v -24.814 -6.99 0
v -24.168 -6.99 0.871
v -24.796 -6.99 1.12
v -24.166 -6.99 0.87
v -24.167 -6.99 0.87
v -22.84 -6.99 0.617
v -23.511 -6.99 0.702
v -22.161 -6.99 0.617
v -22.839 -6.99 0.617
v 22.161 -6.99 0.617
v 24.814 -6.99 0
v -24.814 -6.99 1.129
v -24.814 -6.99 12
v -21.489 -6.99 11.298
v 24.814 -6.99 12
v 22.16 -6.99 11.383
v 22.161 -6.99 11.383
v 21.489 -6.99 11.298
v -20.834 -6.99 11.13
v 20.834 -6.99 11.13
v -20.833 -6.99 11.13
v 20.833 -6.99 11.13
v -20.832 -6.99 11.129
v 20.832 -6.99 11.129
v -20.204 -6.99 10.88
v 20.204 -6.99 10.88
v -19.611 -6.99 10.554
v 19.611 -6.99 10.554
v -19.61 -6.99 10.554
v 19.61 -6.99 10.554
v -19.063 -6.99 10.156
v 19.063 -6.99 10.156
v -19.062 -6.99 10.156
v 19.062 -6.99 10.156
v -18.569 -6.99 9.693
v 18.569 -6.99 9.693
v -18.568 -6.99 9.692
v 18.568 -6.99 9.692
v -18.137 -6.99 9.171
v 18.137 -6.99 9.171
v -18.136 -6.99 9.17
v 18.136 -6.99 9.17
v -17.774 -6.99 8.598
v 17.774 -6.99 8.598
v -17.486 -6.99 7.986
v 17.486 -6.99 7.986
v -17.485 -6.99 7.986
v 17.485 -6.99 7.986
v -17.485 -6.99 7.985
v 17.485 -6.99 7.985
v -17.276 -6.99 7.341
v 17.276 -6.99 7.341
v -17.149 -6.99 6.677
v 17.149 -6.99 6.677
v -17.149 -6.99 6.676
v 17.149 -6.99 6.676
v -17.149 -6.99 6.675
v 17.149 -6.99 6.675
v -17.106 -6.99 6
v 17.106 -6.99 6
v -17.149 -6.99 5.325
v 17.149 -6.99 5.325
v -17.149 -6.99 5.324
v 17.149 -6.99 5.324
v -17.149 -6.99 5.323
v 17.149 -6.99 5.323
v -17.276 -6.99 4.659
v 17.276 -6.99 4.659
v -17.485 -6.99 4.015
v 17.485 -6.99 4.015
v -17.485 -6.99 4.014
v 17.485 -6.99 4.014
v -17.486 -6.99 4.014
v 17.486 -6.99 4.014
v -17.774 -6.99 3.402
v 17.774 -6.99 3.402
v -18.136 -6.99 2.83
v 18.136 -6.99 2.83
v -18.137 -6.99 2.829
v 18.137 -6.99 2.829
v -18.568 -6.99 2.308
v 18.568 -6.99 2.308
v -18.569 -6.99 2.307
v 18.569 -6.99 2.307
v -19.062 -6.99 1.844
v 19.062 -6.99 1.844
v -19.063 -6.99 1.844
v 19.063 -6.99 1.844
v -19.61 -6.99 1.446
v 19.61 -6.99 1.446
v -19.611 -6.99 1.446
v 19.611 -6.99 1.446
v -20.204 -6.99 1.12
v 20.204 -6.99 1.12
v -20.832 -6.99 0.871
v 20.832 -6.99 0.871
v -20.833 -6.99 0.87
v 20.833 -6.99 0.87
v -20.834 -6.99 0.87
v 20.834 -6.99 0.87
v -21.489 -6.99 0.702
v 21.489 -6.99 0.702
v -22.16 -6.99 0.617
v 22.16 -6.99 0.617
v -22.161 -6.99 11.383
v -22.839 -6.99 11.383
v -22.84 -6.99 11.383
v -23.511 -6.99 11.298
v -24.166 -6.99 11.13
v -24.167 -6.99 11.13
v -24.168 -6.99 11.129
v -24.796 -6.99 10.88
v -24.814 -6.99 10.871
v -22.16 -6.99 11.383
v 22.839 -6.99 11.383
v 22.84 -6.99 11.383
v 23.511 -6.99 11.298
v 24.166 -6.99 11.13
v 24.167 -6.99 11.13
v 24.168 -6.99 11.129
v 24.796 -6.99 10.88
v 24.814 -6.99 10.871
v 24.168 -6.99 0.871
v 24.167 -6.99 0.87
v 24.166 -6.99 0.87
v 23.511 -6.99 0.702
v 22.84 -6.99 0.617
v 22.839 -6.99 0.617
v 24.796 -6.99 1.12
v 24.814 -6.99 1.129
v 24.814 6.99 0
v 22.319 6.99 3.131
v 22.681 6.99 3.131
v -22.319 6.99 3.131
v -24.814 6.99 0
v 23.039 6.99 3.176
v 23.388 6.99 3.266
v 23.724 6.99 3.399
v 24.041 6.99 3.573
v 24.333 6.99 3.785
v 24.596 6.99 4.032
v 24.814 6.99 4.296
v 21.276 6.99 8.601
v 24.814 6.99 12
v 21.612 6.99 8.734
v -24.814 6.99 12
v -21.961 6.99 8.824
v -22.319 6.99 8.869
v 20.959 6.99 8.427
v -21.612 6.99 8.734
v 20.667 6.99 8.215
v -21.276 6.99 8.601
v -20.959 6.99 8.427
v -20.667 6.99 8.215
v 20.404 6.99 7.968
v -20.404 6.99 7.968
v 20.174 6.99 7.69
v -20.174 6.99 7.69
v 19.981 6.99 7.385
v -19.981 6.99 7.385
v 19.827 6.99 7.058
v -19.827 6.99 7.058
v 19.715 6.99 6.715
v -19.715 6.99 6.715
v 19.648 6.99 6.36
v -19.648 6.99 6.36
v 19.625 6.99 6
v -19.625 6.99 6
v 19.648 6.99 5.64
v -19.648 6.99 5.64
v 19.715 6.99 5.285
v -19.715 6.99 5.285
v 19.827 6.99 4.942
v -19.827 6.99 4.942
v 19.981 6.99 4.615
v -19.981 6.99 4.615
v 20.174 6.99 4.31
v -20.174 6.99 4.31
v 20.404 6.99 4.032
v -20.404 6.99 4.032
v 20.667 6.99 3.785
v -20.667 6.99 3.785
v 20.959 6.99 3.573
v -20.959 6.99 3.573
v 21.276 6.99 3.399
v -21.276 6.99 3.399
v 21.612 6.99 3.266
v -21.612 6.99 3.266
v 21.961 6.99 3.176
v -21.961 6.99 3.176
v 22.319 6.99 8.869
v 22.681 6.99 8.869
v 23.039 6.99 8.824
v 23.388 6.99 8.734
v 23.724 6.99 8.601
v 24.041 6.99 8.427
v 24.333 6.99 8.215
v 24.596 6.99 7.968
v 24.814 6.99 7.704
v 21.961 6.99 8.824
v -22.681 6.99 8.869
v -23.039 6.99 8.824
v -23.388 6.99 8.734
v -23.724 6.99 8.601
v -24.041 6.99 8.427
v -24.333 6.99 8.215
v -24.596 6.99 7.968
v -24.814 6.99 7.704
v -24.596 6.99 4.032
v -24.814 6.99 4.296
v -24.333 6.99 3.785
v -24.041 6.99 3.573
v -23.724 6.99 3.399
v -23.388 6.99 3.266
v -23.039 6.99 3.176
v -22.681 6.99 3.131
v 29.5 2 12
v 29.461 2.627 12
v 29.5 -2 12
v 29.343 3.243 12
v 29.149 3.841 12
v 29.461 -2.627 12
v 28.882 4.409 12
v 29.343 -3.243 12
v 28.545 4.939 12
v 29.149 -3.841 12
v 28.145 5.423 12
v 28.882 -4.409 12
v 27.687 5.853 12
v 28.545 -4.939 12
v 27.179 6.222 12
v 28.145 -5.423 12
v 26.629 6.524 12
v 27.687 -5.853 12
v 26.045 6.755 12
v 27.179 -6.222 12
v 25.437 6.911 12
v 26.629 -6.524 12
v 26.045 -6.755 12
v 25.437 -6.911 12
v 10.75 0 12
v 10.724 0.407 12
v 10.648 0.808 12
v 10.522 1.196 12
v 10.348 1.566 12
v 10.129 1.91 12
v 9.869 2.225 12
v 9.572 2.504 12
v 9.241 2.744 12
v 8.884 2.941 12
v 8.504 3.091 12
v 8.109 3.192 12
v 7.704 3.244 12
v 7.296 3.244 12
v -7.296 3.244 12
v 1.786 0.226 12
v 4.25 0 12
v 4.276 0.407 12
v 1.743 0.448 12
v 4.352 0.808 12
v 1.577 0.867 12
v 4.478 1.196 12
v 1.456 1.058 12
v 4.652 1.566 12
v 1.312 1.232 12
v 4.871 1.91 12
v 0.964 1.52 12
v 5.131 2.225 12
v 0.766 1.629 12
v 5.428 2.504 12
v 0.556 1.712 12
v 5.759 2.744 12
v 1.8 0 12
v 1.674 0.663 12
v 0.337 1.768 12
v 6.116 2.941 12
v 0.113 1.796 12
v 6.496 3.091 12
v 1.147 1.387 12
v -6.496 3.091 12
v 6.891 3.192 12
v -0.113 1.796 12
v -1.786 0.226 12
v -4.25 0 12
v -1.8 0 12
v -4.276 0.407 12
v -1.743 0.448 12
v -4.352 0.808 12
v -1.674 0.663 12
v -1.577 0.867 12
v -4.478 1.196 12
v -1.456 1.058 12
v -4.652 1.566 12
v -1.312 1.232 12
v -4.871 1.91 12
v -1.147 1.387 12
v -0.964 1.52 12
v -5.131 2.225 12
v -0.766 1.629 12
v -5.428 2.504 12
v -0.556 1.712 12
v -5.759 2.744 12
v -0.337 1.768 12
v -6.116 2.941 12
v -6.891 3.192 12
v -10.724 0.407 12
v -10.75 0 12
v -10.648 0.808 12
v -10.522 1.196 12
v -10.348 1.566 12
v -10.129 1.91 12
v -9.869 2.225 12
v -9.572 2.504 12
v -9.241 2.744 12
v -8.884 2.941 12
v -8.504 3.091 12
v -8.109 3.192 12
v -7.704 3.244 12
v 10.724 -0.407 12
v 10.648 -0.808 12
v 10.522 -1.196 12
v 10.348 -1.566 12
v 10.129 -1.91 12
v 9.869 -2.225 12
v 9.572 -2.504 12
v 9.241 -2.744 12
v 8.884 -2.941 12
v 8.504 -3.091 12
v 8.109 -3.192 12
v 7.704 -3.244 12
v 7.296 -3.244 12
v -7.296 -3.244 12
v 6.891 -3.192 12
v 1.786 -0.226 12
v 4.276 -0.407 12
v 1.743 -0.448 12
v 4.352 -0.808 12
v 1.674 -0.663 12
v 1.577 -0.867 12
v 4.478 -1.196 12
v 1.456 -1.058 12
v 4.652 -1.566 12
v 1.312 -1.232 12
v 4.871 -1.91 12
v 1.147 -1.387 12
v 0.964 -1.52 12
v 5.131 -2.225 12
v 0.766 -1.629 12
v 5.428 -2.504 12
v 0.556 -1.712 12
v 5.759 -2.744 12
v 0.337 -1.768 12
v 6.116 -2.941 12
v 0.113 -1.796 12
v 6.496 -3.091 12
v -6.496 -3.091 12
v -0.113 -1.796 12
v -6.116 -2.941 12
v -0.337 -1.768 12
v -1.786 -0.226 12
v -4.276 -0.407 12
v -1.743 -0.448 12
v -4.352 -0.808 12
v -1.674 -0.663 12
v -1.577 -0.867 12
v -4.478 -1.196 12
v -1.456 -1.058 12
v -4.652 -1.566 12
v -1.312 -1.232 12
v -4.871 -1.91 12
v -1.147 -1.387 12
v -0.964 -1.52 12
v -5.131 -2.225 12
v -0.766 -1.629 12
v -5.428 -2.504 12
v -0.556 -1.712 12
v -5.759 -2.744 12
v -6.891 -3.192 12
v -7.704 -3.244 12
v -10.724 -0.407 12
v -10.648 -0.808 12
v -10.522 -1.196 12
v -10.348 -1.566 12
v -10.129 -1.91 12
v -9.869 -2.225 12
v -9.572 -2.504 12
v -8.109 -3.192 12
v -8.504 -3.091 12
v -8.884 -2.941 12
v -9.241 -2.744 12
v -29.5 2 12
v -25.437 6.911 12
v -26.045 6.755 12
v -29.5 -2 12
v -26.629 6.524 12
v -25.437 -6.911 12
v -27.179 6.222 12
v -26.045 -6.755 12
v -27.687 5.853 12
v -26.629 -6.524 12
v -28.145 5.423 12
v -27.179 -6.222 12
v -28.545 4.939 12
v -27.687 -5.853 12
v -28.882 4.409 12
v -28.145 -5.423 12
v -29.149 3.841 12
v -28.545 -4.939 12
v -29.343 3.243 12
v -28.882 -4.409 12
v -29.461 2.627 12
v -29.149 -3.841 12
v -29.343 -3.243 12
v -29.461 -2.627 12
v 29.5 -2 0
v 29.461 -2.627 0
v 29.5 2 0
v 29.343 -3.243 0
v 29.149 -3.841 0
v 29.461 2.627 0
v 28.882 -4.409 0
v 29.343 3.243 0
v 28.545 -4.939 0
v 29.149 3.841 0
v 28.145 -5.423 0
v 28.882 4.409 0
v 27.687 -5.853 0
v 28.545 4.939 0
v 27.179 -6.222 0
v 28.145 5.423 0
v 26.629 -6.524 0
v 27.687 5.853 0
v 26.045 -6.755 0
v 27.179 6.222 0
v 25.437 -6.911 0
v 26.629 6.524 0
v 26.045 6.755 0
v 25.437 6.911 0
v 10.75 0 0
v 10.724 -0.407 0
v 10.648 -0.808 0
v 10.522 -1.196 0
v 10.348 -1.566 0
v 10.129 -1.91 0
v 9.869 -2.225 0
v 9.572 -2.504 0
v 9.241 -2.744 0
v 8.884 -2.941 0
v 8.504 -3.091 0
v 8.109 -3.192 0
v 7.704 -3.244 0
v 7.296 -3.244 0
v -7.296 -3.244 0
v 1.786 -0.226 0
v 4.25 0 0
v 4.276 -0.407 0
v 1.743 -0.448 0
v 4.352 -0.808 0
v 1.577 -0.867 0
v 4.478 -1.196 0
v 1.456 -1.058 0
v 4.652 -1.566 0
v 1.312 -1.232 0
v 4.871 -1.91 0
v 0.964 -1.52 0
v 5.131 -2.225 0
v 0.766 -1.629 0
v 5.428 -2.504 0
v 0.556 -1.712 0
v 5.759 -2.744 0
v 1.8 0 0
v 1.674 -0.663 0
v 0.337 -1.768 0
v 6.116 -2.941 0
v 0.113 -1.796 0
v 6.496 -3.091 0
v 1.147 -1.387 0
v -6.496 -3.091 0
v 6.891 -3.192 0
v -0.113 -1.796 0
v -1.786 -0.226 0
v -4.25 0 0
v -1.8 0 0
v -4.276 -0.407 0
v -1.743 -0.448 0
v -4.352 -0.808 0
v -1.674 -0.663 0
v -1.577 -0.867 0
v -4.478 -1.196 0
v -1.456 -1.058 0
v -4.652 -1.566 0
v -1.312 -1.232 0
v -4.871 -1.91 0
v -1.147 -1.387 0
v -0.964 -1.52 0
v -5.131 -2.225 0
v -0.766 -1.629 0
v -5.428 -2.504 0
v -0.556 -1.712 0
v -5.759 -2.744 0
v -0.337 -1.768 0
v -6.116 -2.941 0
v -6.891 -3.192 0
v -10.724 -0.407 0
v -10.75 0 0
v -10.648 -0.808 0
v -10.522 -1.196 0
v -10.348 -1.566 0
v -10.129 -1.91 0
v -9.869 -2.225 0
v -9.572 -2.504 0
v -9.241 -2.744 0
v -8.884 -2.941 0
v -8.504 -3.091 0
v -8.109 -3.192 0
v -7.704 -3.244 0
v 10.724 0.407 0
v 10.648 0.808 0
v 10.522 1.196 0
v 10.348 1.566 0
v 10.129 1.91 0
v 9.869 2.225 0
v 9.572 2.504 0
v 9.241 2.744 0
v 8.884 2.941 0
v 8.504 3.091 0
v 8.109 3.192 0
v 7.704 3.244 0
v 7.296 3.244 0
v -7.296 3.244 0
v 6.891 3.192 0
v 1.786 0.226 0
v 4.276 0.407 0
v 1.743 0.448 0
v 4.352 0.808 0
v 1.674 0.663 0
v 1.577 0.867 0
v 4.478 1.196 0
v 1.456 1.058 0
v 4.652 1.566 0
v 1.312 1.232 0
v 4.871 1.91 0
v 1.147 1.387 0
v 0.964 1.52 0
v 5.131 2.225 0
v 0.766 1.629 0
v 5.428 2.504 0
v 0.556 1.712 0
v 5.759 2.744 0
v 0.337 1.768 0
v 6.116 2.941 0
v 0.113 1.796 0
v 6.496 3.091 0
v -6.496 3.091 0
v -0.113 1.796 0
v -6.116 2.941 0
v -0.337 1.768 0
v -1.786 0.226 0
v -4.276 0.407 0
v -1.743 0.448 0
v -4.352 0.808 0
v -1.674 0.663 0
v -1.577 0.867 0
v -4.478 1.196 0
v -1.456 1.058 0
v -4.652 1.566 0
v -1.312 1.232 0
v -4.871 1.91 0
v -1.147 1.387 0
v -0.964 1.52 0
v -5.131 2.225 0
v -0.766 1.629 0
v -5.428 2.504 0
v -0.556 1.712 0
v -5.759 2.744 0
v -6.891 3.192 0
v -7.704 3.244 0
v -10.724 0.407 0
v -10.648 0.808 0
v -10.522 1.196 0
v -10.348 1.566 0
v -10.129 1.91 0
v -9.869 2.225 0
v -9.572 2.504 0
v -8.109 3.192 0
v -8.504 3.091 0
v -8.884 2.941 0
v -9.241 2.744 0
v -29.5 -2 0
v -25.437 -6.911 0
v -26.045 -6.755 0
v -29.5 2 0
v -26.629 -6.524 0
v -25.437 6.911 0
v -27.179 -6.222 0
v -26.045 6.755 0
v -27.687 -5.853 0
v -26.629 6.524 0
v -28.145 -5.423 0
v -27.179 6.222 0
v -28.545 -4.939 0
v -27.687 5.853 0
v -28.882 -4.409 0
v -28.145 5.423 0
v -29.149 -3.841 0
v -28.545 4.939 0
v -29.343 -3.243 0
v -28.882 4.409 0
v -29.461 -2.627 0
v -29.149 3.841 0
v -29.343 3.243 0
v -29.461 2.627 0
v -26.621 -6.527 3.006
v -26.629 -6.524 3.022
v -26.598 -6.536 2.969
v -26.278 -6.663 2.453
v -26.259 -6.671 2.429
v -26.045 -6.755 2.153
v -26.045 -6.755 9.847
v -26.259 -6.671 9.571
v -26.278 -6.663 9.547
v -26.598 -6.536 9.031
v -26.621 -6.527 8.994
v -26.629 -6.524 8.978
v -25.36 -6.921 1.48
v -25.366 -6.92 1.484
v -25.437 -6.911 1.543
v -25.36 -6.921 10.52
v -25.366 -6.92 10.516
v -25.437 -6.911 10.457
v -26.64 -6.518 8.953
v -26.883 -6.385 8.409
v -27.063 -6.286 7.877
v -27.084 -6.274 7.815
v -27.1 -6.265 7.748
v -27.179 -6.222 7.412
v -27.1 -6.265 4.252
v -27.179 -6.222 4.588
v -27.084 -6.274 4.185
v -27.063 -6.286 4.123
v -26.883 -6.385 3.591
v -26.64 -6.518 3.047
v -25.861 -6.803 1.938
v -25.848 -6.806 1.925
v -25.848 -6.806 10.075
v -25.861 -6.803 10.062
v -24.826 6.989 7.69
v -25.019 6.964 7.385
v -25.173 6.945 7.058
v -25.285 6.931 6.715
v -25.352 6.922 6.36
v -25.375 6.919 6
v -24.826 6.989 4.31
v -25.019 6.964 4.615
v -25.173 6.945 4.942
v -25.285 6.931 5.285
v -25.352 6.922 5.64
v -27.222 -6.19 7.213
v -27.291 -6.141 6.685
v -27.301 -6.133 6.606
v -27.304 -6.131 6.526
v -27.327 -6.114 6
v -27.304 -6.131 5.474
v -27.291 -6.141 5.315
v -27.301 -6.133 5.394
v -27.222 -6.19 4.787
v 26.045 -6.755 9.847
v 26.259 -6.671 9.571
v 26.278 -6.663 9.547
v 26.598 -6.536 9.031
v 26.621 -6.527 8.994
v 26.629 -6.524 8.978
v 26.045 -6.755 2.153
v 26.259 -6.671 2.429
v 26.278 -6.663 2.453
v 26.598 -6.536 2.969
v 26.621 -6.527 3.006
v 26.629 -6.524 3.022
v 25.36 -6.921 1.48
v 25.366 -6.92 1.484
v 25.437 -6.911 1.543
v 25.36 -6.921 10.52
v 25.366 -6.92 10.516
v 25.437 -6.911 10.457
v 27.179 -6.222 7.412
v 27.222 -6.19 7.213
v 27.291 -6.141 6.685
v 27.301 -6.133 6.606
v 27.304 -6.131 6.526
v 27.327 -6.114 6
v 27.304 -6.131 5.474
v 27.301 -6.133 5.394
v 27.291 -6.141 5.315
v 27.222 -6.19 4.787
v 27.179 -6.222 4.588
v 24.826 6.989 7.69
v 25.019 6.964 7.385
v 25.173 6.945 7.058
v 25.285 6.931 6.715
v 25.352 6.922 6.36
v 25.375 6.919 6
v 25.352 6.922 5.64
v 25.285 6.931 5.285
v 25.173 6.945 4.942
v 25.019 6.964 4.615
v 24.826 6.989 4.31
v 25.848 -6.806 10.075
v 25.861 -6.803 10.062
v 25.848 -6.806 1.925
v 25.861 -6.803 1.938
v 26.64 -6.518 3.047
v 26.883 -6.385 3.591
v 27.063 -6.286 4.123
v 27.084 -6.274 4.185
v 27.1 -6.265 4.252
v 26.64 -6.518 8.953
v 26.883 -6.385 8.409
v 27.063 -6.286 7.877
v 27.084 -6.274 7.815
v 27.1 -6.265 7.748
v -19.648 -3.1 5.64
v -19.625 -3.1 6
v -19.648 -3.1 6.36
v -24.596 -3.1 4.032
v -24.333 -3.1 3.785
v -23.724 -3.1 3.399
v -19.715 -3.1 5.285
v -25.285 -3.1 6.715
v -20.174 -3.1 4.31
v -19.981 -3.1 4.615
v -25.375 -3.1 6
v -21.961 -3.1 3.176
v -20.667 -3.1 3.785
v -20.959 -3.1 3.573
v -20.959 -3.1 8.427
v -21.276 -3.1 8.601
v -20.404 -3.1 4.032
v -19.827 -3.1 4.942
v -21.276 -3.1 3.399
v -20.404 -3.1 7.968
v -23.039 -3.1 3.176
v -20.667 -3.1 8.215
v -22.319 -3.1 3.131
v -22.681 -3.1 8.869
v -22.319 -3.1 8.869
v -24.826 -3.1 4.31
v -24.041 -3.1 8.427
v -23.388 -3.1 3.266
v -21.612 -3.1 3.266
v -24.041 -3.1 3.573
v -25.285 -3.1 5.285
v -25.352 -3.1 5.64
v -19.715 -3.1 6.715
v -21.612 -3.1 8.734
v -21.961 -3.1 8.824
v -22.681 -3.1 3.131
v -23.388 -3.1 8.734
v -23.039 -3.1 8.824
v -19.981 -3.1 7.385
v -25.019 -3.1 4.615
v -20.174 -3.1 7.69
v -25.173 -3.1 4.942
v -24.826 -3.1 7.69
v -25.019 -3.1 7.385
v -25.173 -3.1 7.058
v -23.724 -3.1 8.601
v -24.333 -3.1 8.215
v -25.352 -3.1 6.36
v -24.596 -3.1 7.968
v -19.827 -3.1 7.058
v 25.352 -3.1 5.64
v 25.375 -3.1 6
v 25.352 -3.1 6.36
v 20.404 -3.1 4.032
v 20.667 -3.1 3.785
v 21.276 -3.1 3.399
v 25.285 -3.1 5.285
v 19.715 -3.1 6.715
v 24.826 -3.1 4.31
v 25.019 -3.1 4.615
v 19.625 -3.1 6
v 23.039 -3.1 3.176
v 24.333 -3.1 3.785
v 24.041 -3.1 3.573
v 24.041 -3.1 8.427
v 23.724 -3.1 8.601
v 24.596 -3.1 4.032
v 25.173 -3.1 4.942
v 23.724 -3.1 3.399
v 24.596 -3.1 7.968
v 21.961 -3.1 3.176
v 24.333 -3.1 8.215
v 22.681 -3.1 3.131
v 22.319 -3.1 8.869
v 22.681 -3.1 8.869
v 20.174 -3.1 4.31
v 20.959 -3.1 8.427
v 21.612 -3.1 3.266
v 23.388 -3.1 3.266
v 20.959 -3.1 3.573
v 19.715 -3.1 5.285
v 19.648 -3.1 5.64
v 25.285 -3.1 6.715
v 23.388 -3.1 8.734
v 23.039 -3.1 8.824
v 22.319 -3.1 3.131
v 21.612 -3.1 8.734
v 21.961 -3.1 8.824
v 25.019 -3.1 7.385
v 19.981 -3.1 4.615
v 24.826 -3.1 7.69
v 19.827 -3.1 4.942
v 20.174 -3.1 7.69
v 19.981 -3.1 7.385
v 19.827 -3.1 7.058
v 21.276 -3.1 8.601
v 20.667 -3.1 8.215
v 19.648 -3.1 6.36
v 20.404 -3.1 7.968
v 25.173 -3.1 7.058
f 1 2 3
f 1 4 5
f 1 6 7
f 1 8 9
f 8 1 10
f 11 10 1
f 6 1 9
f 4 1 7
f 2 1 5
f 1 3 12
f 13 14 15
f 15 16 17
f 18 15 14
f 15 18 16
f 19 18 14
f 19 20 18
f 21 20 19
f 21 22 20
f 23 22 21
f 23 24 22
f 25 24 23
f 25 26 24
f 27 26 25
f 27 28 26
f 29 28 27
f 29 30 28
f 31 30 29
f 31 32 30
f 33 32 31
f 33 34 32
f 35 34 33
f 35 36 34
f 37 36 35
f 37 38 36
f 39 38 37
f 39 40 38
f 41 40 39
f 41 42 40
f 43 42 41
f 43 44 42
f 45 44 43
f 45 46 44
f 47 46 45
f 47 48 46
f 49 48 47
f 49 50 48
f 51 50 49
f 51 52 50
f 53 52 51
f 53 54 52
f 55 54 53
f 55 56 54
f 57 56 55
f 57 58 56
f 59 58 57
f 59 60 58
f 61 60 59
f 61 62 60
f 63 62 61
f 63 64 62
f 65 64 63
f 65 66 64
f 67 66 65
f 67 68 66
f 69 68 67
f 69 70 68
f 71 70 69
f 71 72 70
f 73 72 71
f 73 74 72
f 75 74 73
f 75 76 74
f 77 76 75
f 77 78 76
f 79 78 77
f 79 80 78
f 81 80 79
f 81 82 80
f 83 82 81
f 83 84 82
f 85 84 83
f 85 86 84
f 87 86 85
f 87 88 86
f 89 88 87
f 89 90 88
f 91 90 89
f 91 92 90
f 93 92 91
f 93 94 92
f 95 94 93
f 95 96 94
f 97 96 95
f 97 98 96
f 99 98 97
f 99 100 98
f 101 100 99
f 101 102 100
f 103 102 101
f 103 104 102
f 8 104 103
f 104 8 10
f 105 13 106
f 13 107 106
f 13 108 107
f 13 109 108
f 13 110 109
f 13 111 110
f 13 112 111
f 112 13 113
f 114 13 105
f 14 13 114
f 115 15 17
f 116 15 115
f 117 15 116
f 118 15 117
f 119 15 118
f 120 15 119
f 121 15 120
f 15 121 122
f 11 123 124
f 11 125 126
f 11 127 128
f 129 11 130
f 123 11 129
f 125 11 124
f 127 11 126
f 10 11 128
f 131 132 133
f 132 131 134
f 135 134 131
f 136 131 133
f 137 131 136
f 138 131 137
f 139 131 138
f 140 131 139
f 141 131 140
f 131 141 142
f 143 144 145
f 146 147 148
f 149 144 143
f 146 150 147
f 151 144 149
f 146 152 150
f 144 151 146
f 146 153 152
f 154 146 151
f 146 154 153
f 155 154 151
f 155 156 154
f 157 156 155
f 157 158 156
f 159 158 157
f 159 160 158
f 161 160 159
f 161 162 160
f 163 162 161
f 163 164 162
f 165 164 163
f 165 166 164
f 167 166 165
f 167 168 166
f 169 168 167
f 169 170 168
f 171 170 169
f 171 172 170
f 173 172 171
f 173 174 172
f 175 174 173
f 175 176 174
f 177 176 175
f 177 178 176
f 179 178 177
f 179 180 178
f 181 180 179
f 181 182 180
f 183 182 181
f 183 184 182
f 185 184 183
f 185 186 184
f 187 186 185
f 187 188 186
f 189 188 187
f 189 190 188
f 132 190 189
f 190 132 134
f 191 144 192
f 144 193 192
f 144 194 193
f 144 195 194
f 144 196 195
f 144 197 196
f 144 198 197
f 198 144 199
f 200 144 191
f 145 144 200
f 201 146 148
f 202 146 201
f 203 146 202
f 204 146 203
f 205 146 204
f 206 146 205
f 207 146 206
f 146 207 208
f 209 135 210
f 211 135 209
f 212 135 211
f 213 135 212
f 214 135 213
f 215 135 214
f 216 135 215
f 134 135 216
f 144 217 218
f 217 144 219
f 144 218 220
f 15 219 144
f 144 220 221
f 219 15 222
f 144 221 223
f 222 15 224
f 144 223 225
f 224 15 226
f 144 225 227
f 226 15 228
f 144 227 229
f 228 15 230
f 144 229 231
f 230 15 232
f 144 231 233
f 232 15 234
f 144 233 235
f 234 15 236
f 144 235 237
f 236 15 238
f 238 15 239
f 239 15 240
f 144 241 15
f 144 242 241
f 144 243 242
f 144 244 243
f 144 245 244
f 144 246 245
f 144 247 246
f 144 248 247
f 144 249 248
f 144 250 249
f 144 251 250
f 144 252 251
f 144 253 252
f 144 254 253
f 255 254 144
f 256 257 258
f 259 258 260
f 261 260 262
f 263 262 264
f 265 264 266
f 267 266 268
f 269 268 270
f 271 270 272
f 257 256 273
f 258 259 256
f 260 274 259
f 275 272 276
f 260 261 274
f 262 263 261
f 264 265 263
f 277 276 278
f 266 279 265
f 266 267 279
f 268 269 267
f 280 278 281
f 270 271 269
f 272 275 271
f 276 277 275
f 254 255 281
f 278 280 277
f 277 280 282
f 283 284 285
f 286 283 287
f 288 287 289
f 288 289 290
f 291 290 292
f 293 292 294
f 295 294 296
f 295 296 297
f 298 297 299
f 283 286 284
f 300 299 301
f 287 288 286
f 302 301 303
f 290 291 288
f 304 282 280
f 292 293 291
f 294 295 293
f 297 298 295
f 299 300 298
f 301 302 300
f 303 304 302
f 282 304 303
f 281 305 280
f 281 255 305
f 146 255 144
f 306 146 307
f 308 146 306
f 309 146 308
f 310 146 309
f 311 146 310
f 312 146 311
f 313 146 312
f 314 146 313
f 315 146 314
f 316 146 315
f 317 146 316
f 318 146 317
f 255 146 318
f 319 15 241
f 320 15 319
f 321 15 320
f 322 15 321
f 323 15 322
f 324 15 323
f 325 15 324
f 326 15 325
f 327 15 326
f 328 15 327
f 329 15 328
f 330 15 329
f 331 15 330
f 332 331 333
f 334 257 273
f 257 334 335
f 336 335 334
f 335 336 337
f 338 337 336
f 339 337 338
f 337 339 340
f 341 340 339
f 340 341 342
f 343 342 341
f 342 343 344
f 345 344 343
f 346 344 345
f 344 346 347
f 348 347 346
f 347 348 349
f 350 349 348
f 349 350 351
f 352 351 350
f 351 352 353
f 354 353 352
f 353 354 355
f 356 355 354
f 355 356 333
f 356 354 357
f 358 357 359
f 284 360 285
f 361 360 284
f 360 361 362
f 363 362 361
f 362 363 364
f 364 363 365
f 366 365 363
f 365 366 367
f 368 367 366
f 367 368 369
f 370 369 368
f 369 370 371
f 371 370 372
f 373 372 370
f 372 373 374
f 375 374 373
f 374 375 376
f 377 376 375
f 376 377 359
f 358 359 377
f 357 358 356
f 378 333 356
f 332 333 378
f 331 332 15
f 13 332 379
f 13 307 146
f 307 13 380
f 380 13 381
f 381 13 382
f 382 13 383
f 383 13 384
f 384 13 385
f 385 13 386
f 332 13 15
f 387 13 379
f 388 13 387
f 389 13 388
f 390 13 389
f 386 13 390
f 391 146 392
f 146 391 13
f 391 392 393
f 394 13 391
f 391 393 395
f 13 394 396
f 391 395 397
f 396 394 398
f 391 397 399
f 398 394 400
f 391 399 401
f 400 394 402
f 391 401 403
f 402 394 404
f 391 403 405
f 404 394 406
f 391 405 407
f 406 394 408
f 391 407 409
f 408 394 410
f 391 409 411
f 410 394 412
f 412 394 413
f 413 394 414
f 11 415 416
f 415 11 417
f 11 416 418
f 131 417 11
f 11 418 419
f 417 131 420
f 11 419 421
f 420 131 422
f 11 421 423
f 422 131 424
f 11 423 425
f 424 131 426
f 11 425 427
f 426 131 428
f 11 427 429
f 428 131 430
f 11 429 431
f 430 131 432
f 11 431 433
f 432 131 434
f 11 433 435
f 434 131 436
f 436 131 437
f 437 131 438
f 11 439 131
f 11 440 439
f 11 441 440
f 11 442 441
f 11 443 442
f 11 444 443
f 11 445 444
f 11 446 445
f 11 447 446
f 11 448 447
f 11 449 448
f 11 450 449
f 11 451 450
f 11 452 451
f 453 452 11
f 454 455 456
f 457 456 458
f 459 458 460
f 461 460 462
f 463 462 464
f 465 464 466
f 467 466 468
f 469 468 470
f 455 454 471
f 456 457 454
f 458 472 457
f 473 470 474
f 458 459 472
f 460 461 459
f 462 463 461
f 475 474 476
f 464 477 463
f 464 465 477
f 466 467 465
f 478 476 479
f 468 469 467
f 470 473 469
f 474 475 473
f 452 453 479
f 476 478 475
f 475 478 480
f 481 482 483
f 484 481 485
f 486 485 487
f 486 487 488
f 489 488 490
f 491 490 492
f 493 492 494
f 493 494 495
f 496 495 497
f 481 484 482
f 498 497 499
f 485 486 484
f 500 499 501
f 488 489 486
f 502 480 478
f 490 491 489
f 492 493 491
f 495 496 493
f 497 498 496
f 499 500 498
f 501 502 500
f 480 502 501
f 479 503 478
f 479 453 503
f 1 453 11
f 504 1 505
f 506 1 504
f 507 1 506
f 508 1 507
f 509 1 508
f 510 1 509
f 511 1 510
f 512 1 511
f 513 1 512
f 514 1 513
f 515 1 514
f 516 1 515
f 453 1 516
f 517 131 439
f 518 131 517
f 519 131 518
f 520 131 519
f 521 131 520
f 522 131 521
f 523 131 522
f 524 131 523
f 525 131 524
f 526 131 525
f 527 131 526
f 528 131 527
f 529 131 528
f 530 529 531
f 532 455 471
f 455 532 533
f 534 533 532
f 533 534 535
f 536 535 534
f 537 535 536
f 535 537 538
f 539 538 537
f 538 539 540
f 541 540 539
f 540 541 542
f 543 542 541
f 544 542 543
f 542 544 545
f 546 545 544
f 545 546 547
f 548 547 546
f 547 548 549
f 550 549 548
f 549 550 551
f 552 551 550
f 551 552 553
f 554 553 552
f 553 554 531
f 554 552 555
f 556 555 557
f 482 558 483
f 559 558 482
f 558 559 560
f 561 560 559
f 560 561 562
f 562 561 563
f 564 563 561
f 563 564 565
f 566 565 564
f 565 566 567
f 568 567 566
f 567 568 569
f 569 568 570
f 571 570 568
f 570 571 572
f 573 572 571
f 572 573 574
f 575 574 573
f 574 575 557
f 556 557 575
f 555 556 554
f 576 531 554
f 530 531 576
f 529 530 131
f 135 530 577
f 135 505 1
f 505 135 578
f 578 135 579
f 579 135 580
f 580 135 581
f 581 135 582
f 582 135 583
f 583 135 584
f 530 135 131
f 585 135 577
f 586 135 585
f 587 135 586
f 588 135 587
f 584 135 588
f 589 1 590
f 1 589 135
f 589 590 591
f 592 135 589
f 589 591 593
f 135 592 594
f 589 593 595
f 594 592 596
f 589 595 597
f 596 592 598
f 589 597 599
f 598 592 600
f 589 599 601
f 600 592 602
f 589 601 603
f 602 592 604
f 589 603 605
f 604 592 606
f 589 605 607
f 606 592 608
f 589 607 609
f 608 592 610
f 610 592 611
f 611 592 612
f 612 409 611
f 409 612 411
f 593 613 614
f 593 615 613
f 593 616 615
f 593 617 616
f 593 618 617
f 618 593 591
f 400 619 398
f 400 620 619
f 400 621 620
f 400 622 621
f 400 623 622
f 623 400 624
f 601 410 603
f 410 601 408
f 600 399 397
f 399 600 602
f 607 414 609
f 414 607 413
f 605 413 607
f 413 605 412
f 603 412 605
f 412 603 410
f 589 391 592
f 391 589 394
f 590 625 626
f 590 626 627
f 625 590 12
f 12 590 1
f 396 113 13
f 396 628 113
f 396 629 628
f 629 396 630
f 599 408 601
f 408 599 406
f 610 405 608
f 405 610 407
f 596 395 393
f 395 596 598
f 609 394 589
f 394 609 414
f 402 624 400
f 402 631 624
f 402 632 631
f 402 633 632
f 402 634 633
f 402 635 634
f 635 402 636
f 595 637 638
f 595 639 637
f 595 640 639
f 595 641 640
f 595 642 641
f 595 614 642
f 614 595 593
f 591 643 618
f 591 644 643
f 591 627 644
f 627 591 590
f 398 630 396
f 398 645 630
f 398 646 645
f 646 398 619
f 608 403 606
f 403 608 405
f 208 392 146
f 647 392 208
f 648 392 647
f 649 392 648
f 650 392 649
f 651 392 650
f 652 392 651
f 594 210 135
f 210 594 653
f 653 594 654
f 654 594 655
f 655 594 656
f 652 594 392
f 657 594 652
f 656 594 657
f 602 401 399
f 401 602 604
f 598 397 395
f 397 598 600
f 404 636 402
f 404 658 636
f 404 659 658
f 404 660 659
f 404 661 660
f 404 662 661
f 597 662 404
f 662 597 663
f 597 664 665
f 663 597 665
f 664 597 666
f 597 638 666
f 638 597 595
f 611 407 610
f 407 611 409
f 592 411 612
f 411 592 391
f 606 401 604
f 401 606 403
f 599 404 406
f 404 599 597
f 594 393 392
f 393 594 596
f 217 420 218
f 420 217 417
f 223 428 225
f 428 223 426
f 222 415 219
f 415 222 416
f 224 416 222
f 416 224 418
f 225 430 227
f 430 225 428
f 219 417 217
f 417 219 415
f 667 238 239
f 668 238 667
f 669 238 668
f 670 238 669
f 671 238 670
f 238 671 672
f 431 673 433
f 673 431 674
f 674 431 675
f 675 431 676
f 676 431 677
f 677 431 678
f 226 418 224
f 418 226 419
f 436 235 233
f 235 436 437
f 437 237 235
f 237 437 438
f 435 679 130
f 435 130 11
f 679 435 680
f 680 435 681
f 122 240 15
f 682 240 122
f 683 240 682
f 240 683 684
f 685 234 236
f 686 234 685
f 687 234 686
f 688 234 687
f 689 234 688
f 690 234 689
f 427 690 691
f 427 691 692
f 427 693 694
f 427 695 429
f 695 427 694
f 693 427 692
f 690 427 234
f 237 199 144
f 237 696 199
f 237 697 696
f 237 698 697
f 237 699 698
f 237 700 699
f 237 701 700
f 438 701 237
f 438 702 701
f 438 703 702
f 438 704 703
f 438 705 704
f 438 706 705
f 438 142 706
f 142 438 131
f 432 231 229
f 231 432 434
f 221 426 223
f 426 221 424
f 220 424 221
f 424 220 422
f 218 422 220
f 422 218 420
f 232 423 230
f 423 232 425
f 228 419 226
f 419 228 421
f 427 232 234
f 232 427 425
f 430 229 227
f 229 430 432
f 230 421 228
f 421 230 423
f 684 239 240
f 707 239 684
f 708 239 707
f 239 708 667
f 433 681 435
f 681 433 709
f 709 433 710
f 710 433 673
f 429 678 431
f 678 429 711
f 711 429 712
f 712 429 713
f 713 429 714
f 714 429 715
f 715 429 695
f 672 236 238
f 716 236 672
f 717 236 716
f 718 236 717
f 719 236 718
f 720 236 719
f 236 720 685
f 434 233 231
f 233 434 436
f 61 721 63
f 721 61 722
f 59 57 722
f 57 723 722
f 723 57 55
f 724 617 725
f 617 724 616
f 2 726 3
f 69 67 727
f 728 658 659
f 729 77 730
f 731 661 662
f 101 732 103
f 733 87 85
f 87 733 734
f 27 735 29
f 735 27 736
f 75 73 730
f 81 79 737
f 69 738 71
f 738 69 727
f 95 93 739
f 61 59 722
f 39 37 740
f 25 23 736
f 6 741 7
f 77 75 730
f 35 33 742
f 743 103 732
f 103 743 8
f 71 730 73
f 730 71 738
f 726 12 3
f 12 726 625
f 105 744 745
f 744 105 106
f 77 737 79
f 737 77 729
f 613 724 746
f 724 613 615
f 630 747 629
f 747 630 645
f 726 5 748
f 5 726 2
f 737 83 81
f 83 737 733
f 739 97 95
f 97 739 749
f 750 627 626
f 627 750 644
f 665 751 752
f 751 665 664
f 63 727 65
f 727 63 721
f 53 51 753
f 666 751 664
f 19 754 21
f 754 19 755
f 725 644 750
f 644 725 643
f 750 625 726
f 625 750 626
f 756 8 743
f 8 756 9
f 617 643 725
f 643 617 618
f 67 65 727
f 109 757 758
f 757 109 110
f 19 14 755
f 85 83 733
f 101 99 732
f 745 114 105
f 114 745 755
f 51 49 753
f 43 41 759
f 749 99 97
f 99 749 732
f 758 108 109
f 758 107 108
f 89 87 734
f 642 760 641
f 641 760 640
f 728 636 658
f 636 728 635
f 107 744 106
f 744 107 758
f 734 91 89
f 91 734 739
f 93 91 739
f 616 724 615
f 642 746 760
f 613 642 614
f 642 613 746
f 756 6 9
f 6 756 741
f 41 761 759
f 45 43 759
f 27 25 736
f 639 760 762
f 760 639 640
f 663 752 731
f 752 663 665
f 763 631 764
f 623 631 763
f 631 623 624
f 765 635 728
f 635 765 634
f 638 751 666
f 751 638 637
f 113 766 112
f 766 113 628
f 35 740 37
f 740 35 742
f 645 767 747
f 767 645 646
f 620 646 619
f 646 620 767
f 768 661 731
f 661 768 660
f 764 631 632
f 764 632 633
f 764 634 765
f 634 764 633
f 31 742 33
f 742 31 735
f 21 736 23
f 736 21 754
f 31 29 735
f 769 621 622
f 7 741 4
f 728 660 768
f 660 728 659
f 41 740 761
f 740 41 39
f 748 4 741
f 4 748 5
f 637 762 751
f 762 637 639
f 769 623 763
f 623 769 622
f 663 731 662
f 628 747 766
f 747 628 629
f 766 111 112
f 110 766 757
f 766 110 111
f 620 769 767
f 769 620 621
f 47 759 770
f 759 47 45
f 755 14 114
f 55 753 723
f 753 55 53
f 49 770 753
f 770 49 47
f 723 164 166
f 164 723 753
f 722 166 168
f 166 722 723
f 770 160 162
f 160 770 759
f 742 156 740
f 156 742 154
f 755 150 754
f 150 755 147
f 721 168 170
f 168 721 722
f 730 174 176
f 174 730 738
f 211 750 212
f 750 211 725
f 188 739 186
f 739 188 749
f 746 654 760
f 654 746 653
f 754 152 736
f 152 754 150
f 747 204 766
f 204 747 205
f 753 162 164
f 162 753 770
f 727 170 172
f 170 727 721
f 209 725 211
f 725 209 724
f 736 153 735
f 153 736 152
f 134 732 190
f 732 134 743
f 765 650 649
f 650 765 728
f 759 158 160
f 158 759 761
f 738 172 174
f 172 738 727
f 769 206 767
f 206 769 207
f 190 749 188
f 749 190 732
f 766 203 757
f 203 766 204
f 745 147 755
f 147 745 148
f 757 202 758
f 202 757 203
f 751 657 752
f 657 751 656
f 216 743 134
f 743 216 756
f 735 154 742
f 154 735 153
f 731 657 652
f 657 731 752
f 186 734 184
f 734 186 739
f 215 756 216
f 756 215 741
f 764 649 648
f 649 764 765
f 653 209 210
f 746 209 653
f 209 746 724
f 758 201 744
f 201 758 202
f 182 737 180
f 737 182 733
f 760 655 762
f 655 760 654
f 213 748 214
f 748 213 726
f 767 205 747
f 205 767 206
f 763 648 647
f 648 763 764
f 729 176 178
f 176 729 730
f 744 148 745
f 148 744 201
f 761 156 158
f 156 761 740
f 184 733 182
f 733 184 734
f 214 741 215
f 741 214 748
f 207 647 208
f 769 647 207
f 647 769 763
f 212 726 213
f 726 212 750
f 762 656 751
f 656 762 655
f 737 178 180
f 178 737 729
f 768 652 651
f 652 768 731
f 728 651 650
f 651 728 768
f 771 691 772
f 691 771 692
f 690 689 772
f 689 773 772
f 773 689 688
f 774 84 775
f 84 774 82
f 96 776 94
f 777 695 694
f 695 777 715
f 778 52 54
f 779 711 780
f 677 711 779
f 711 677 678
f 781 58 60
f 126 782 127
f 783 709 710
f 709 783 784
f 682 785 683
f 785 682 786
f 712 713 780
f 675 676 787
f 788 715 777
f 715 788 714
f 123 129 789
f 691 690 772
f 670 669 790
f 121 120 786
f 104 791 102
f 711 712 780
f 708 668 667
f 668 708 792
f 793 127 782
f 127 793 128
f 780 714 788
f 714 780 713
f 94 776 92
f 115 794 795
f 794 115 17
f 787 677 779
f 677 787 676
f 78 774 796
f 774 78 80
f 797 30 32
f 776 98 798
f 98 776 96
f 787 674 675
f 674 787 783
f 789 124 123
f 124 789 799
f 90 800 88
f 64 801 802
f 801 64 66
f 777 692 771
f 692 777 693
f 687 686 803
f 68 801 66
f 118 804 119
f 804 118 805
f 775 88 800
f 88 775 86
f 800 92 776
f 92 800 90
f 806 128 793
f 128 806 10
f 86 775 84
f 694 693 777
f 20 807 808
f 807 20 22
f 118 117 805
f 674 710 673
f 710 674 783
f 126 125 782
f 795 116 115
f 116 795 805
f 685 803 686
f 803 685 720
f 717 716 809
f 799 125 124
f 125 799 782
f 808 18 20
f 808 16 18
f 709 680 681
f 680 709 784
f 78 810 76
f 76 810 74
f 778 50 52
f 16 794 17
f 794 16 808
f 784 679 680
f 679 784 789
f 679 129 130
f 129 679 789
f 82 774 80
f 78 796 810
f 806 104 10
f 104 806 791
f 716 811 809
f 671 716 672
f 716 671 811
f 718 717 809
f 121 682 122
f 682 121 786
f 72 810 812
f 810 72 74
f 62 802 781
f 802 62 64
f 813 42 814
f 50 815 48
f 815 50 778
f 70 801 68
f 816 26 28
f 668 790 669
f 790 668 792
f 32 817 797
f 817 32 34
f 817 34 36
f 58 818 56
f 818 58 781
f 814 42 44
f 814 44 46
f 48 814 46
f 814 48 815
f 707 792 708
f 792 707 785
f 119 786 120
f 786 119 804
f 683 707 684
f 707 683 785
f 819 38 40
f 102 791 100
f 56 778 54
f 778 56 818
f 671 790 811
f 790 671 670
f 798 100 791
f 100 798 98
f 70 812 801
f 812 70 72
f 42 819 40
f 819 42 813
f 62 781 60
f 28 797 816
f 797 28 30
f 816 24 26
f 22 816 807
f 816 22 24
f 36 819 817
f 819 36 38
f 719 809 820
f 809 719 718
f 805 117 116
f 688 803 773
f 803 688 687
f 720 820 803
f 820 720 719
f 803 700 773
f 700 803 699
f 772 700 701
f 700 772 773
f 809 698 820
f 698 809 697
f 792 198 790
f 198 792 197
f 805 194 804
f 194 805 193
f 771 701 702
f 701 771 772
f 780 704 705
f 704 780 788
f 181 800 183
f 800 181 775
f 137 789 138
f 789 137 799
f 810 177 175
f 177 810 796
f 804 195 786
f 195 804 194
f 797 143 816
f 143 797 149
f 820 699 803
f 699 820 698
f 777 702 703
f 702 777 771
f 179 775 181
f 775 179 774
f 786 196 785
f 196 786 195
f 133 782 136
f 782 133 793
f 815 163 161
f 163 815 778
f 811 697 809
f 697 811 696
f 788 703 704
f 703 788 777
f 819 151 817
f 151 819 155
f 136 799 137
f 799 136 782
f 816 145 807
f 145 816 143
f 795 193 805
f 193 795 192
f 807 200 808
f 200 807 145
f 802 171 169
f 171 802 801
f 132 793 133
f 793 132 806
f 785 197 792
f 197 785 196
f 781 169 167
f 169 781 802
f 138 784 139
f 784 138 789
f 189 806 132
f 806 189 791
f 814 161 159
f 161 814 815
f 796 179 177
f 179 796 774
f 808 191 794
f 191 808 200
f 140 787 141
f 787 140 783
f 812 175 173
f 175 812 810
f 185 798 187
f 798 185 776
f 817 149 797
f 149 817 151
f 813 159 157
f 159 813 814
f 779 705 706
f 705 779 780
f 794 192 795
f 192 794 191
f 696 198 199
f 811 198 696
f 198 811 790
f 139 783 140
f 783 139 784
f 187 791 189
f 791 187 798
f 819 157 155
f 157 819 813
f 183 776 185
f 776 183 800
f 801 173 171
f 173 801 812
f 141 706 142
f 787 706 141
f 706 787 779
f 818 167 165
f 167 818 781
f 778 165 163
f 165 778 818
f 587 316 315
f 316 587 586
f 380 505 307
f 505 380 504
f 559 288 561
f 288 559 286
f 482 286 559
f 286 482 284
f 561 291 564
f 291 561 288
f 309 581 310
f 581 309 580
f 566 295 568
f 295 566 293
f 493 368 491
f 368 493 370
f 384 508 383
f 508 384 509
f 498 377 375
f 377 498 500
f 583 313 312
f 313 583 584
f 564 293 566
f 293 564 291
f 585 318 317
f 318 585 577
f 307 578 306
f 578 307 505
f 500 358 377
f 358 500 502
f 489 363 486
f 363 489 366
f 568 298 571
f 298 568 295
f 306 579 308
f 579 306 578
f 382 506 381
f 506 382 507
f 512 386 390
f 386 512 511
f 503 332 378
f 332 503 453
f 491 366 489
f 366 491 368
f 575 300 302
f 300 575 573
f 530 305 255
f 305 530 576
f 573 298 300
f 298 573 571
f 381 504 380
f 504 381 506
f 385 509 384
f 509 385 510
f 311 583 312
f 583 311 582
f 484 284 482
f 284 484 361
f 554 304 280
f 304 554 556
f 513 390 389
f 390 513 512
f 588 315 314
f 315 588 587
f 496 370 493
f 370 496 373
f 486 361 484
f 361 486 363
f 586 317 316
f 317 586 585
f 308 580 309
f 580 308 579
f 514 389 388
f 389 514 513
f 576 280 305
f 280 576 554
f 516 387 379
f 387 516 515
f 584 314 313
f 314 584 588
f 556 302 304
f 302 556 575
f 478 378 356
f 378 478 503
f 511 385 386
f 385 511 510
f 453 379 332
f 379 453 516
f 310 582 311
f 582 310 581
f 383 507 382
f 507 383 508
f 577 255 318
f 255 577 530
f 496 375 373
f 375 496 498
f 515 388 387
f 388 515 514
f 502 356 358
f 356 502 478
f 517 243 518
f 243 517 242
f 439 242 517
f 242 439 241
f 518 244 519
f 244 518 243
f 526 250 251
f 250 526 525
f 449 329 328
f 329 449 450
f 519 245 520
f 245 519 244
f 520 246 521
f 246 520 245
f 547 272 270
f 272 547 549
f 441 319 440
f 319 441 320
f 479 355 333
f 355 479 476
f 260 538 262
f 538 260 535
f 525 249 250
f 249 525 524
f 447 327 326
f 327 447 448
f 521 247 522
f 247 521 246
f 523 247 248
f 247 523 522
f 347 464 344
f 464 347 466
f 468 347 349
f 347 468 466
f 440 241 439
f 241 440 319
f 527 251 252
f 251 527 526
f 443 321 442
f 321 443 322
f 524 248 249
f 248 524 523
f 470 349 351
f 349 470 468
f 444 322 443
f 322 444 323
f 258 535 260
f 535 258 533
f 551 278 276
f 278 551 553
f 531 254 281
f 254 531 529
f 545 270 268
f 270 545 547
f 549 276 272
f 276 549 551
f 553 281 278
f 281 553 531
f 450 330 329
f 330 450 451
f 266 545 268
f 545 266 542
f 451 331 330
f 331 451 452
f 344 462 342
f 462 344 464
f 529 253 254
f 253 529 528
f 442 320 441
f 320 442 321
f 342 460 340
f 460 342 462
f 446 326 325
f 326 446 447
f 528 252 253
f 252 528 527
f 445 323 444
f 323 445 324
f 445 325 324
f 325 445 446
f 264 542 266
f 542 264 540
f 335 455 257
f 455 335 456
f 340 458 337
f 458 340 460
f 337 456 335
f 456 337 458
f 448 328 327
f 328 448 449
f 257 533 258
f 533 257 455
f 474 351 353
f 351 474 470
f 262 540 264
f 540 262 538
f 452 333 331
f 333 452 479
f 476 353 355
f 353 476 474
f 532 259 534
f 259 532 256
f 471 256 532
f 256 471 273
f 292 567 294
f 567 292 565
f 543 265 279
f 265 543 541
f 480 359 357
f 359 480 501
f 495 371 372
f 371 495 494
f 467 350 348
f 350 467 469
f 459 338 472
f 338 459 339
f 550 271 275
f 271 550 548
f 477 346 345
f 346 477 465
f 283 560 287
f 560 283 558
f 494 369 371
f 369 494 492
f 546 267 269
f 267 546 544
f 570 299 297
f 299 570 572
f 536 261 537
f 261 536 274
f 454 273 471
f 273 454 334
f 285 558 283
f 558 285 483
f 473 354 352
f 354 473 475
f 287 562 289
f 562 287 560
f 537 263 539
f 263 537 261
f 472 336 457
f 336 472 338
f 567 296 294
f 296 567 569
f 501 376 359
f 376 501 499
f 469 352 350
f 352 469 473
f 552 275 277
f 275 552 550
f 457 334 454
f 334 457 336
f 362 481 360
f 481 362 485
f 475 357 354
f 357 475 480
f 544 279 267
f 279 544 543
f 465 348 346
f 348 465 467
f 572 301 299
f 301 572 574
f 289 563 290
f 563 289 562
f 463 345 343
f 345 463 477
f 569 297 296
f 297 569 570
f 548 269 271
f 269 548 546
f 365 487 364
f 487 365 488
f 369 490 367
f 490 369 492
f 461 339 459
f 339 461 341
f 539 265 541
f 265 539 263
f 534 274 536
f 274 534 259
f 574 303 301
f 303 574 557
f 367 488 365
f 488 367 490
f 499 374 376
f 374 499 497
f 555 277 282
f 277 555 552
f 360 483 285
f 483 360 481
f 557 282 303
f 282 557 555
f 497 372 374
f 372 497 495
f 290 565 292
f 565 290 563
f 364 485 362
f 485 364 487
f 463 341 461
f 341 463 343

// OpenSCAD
$fn = 50;


difference() {
	union() {
		hull() {
			translate(v = [-9.5000000000, 2.0000000000, 0]) {
				cylinder(h = 12, r = 5);
			}
			translate(v = [9.5000000000, 2.0000000000, 0]) {
				cylinder(h = 12, r = 5);
			}
			translate(v = [-9.5000000000, -2.0000000000, 0]) {
				cylinder(h = 12, r = 5);
			}
			translate(v = [9.5000000000, -2.0000000000, 0]) {
				cylinder(h = 12, r = 5);
			}
		}
		translate(v = [-15.0000000000, 0.0000000000, 0]) {
			hull() {
				translate(v = [-9.5000000000, 2.0000000000, 0]) {
					cylinder(h = 12, r = 5);
				}
				translate(v = [9.5000000000, 2.0000000000, 0]) {
					cylinder(h = 12, r = 5);
				}
				translate(v = [-9.5000000000, -2.0000000000, 0]) {
					cylinder(h = 12, r = 5);
				}
				translate(v = [9.5000000000, -2.0000000000, 0]) {
					cylinder(h = 12, r = 5);
				}
			}
		}
		translate(v = [15.0000000000, 0.0000000000, 0]) {
			hull() {
				translate(v = [-9.5000000000, 2.0000000000, 0]) {
					cylinder(h = 12, r = 5);
				}
				translate(v = [9.5000000000, 2.0000000000, 0]) {
					cylinder(h = 12, r = 5);
				}
				translate(v = [-9.5000000000, -2.0000000000, 0]) {
					cylinder(h = 12, r = 5);
				}
				translate(v = [9.5000000000, -2.0000000000, 0]) {
					cylinder(h = 12, r = 5);
				}
			}
		}
	}
	union() {
		translate(v = [-22.5000000000, -7.0000000000, 6.0000000000]) {
			rotate(a = [90, 0, 0]) {
				difference() {
					union() {
						#translate(v = [0, 0, -14.0000000000]) {
							cylinder(h = 14, r = 2.6000000000);
						}
						#translate(v = [0, 0, -3.9000000000]) {
							cylinder(h = 3.9000000000, r1 = 2.8750000000, r2 = 5.4000000000);
						}
						#translate(v = [0, 0, -14.0000000000]) {
							cylinder(h = 14, r = 2.8750000000);
						}
						#translate(v = [0, 0, -14.0000000000]) {
							cylinder(h = 14, r = 2.6000000000);
						}
					}
					union();
				}
			}
		}
		translate(v = [22.5000000000, -7.0000000000, 6.0000000000]) {
			rotate(a = [90, 0, 0]) {
				difference() {
					union() {
						#translate(v = [0, 0, -14.0000000000]) {
							cylinder(h = 14, r = 2.6000000000);
						}
						#translate(v = [0, 0, -3.9000000000]) {
							cylinder(h = 3.9000000000, r1 = 2.8750000000, r2 = 5.4000000000);
						}
						#translate(v = [0, 0, -14.0000000000]) {
							cylinder(h = 14, r = 2.8750000000);
						}
						#translate(v = [0, 0, -14.0000000000]) {
							cylinder(h = 14, r = 2.6000000000);
						}
					}
					union();
				}
			}
		}
		translate(v = [-7.5000000000, 0.0000000000, 0]) {
			translate(v = [0, 0, -100]) {
				cylinder(h = 200, r = 3.2500000000);
			}
		}
		translate(v = [7.5000000000, 0.0000000000, 0]) {
			translate(v = [0, 0, -100]) {
				cylinder(h = 200, r = 3.2500000000);
			}
		}
		translate(v = [-7.5000000000, 0.0000000000, 0]) {
			translate(v = [0, 0, -100]) {
				cylinder(h = 200, r = 1.8000000000);
			}
		}
		translate(v = [0, 0, -100]) {
			cylinder(h = 200, r = 1.8000000000);
		}
		translate(v = [7.5000000000, 0.0000000000, 0]) {
			translate(v = [0, 0, -100]) {
				cylinder(h = 200, r = 1.8000000000);
			}
		}
	}
}
